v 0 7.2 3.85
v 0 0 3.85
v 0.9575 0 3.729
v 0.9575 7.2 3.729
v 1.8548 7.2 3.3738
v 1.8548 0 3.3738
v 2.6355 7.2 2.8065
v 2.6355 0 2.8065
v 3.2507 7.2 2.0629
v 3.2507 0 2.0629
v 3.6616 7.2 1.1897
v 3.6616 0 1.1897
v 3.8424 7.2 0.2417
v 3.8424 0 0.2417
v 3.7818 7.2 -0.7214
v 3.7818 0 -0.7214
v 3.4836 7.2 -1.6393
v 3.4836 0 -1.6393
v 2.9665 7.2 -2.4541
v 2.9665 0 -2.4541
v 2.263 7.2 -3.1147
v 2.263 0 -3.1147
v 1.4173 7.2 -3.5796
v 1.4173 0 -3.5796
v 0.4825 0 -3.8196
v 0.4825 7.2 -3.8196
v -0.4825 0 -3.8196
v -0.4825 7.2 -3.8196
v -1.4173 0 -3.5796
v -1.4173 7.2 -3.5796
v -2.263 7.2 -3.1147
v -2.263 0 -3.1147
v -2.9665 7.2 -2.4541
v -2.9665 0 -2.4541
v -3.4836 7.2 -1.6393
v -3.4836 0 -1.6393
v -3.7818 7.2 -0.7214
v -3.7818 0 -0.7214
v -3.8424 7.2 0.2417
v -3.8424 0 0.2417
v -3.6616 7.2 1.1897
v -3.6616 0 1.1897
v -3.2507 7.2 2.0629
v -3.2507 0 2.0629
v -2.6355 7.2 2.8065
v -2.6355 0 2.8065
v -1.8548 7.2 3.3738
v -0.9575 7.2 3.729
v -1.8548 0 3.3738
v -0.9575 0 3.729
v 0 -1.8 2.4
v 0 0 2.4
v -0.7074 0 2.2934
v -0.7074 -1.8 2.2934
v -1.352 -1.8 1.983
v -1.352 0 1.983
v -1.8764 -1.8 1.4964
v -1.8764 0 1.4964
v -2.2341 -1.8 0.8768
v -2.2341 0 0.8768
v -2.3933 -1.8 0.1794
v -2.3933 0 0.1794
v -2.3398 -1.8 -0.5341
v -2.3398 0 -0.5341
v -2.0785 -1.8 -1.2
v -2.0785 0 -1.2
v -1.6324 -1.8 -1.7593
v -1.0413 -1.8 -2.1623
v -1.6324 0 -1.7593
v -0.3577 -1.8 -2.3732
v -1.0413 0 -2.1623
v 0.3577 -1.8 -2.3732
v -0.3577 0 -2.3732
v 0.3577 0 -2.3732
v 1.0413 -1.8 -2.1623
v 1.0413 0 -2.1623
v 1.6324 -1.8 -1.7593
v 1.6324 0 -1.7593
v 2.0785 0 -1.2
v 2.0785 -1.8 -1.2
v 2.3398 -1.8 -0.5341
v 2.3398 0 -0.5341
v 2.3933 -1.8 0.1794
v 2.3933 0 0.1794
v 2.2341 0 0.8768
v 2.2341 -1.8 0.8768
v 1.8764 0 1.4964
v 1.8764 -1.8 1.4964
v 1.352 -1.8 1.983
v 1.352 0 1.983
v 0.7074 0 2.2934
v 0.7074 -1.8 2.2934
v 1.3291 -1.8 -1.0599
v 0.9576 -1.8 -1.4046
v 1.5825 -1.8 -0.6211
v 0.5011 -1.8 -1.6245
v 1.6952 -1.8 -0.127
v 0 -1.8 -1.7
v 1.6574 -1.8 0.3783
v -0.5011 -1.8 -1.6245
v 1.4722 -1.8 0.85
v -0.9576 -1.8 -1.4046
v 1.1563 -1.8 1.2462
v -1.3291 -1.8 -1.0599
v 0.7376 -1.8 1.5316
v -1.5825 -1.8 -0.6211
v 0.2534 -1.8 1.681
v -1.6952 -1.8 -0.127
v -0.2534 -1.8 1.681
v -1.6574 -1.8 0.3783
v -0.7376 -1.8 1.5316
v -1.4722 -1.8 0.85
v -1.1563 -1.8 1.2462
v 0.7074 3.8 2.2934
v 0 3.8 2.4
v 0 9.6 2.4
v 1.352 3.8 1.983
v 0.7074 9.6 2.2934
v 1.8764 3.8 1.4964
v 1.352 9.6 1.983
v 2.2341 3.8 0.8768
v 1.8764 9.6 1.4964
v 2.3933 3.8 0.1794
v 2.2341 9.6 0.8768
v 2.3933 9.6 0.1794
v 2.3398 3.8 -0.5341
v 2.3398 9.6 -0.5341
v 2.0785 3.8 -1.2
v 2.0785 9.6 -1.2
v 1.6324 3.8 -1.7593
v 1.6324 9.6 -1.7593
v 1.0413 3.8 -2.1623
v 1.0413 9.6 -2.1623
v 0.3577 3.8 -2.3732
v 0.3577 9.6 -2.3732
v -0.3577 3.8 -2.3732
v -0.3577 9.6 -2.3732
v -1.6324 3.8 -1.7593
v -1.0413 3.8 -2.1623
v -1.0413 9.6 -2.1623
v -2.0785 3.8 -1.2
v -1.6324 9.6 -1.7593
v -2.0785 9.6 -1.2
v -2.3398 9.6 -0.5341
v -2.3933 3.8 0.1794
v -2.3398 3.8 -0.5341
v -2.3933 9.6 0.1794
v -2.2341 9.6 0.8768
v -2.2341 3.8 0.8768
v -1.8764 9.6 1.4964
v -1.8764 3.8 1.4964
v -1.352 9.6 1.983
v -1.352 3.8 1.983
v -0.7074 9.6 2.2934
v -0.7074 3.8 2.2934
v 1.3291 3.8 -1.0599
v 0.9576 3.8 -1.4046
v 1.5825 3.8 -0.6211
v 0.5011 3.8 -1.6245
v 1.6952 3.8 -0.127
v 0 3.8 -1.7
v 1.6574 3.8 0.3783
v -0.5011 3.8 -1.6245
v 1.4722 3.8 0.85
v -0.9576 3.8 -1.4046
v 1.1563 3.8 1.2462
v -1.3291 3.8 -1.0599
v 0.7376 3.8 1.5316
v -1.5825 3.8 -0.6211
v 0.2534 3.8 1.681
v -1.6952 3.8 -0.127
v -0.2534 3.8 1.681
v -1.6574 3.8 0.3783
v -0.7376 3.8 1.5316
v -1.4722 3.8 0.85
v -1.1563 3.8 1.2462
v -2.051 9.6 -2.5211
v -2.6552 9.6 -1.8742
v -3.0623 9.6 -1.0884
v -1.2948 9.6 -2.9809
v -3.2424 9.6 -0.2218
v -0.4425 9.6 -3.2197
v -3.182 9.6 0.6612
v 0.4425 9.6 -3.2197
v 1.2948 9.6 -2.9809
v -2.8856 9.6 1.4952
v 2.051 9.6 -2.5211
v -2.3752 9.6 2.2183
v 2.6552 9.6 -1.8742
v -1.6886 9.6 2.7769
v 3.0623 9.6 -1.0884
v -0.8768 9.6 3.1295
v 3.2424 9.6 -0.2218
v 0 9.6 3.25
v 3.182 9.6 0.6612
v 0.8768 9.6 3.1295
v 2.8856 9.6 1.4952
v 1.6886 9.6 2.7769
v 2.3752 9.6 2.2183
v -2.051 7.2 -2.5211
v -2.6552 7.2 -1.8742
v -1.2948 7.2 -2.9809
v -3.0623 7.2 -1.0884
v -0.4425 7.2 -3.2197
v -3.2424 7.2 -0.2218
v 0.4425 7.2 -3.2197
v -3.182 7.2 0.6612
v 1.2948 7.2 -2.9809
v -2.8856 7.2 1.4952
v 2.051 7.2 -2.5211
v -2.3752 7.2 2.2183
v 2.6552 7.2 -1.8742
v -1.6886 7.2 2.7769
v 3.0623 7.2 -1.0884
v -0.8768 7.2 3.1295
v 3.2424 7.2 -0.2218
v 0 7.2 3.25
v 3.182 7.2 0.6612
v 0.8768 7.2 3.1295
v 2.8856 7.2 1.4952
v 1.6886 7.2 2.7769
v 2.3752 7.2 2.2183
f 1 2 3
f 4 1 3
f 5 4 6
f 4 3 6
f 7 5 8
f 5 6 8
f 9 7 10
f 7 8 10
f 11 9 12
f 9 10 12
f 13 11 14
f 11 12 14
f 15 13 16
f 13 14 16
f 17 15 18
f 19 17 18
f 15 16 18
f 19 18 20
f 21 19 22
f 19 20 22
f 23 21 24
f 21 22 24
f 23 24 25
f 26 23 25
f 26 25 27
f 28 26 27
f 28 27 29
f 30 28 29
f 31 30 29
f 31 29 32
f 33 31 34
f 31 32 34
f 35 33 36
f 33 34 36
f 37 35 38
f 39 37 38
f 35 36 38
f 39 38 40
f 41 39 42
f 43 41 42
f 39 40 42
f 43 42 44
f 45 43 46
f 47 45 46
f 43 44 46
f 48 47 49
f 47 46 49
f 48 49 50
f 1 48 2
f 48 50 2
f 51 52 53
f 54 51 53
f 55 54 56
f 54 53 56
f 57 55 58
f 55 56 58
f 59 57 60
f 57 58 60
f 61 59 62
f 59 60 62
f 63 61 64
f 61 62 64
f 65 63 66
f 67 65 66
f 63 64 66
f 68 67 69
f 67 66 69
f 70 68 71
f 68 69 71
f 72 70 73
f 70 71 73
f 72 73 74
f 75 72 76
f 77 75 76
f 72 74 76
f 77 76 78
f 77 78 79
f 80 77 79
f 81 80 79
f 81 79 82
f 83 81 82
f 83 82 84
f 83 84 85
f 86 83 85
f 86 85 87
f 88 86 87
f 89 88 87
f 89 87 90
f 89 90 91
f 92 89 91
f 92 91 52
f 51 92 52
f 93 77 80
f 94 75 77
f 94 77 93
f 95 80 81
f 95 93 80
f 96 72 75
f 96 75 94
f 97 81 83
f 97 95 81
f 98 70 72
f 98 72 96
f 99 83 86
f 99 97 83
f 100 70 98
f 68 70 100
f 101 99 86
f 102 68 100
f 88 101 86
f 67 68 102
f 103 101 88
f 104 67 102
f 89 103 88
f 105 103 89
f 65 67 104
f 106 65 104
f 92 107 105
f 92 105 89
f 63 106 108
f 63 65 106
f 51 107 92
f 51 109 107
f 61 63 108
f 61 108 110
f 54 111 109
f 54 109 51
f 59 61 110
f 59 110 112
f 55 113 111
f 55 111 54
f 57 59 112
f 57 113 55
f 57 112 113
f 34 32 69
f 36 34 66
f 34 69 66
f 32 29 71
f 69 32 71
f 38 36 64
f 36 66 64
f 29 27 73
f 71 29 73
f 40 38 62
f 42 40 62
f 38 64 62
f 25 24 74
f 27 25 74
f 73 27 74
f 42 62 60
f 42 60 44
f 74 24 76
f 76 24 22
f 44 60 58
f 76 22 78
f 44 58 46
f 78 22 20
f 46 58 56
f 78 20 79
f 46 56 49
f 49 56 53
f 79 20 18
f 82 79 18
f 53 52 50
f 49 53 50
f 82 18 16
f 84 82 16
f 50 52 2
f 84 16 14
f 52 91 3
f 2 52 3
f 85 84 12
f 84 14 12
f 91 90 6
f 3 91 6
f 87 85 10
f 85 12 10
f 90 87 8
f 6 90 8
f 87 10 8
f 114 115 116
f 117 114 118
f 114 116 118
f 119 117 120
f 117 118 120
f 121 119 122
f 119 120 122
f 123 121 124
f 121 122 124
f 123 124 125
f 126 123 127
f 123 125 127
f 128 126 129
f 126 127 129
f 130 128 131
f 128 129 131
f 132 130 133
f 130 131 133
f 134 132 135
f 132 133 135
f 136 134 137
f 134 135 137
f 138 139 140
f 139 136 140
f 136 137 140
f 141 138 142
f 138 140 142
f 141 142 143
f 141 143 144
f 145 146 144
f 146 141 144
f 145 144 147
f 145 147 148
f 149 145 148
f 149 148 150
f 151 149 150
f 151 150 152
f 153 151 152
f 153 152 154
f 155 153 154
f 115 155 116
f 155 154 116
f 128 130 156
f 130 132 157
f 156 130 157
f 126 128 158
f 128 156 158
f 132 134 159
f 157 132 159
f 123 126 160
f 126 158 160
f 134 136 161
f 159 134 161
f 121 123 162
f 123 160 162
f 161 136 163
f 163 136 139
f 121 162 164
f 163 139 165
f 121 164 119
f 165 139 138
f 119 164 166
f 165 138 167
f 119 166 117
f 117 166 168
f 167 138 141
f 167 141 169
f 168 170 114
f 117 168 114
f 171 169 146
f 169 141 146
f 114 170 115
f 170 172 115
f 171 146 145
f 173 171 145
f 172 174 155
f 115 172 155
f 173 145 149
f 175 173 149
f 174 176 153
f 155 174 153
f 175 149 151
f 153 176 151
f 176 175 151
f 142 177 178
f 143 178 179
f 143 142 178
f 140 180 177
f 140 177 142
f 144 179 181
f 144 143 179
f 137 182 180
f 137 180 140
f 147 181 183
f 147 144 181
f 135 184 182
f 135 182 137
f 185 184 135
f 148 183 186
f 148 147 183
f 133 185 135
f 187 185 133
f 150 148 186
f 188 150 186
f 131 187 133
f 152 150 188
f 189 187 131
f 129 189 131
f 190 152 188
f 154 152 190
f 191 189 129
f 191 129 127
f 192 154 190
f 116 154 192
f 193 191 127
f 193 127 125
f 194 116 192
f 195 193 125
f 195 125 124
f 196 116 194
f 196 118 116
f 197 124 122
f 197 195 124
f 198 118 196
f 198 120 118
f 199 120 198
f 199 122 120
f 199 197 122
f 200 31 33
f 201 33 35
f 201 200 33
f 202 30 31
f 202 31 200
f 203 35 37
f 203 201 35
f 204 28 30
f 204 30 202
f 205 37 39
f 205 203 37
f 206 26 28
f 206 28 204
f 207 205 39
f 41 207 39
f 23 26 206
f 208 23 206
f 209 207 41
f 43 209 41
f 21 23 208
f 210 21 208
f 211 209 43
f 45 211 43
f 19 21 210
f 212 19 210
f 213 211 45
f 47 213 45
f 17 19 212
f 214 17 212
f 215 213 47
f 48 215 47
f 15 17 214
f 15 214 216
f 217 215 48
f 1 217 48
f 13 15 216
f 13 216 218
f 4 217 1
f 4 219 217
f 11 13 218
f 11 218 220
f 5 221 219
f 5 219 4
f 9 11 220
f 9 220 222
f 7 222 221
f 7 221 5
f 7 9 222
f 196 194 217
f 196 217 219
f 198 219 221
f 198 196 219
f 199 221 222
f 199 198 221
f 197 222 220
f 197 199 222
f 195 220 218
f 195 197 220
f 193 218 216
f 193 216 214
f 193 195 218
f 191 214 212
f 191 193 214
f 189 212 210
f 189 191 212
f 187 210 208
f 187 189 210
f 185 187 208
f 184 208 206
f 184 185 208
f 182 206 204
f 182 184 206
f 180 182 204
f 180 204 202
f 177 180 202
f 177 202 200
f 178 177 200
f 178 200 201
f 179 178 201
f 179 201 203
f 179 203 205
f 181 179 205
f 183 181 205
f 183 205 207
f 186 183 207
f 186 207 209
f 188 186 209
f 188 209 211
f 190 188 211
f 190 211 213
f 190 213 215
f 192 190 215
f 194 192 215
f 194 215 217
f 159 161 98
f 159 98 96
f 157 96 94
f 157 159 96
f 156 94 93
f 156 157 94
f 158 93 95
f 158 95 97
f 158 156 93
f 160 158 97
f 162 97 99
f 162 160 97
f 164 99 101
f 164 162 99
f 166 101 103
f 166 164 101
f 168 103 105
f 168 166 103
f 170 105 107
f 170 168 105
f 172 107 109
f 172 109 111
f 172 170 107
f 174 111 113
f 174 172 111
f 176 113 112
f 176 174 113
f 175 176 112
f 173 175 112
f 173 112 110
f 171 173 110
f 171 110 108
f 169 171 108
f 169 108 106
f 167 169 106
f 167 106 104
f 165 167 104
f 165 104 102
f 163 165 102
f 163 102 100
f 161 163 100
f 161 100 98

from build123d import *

# Parameters (mm, degrees)
SKETCH1_R           = 3.85
BOSS_EXTRUDE1_DEPTH = 7.2
SKETCH3_R           = 3.25
SKETCH3_R_2         = 2.4
BOSS_EXTRUDE2_DEPTH = 8
SKETCH4_R           = 2.4
CUT_EXTRUDE2_DEPTH  = 5.6
BOSS_EXTRUDE3_START = -5.6
SKETCH5_R           = 2.4
SKETCH5_R_2         = 1.7
BOSS_EXTRUDE3_DEPTH = 5.6
SKETCH6_R           = 1.7
CUT_EXTRUDE3_DEPTH  = 12.036530252


with BuildPart() as part:
    # Sketch1 → Boss-Extrude1 (new body)
    with BuildSketch(Plane(origin=(0, 0, 0), x_dir=(1, 0, 0), z_dir=(0, 1, 0))):
        with Locations(Location((0, 0, 0), (0, 0, 270))):
            Circle(SKETCH1_R)
    extrude(amount=BOSS_EXTRUDE1_DEPTH)

    # Sketch3 → Boss-Extrude2 (add)
    with BuildSketch(Plane(origin=(0, 9.6, 0), x_dir=(1, 0, 0), z_dir=(0, 1, 0))):
        with Locations(Location((0, 0, 0), (0, 0, 270))):
            Circle(SKETCH3_R)
        with Locations(Location((0, 0, 0), (0, 0, 270))):
            Circle(SKETCH3_R_2, mode=Mode.SUBTRACT)
    extrude(amount=-BOSS_EXTRUDE2_DEPTH)

    # Sketch4 → Cut-Extrude2 (cut)
    with BuildSketch(Plane(origin=(0, 7.2, 0), x_dir=(1, 0, 0), z_dir=(0, 1, 0))):
        with Locations(Location((0, 0, 0), (0, 0, 270))):
            Circle(SKETCH4_R)
    extrude(amount=-CUT_EXTRUDE2_DEPTH, mode=Mode.SUBTRACT)

    # Sketch5 → Boss-Extrude3 (add)
    with BuildSketch(Plane(origin=(0, -1.8, 0), x_dir=(-1, 0, 0), z_dir=(0, -1, 0)).offset(BOSS_EXTRUDE3_START)):
        with Locations(Location((0, 0, 0), (0, 0, 270))):
            Circle(SKETCH5_R)
        with Locations(Location((0, 0, 0), (0, 0, 90))):
            Circle(SKETCH5_R_2, mode=Mode.SUBTRACT)
    extrude(amount=BOSS_EXTRUDE3_DEPTH)

    # Sketch6 → Cut-Extrude3 (cut, through all)
    with BuildSketch(Plane.XZ):
        with Locations(Location((0, 0, 0), (0, 0, 270))):
            Circle(SKETCH6_R)
    extrude(amount=-CUT_EXTRUDE3_DEPTH, mode=Mode.SUBTRACT)


solid = part.part
